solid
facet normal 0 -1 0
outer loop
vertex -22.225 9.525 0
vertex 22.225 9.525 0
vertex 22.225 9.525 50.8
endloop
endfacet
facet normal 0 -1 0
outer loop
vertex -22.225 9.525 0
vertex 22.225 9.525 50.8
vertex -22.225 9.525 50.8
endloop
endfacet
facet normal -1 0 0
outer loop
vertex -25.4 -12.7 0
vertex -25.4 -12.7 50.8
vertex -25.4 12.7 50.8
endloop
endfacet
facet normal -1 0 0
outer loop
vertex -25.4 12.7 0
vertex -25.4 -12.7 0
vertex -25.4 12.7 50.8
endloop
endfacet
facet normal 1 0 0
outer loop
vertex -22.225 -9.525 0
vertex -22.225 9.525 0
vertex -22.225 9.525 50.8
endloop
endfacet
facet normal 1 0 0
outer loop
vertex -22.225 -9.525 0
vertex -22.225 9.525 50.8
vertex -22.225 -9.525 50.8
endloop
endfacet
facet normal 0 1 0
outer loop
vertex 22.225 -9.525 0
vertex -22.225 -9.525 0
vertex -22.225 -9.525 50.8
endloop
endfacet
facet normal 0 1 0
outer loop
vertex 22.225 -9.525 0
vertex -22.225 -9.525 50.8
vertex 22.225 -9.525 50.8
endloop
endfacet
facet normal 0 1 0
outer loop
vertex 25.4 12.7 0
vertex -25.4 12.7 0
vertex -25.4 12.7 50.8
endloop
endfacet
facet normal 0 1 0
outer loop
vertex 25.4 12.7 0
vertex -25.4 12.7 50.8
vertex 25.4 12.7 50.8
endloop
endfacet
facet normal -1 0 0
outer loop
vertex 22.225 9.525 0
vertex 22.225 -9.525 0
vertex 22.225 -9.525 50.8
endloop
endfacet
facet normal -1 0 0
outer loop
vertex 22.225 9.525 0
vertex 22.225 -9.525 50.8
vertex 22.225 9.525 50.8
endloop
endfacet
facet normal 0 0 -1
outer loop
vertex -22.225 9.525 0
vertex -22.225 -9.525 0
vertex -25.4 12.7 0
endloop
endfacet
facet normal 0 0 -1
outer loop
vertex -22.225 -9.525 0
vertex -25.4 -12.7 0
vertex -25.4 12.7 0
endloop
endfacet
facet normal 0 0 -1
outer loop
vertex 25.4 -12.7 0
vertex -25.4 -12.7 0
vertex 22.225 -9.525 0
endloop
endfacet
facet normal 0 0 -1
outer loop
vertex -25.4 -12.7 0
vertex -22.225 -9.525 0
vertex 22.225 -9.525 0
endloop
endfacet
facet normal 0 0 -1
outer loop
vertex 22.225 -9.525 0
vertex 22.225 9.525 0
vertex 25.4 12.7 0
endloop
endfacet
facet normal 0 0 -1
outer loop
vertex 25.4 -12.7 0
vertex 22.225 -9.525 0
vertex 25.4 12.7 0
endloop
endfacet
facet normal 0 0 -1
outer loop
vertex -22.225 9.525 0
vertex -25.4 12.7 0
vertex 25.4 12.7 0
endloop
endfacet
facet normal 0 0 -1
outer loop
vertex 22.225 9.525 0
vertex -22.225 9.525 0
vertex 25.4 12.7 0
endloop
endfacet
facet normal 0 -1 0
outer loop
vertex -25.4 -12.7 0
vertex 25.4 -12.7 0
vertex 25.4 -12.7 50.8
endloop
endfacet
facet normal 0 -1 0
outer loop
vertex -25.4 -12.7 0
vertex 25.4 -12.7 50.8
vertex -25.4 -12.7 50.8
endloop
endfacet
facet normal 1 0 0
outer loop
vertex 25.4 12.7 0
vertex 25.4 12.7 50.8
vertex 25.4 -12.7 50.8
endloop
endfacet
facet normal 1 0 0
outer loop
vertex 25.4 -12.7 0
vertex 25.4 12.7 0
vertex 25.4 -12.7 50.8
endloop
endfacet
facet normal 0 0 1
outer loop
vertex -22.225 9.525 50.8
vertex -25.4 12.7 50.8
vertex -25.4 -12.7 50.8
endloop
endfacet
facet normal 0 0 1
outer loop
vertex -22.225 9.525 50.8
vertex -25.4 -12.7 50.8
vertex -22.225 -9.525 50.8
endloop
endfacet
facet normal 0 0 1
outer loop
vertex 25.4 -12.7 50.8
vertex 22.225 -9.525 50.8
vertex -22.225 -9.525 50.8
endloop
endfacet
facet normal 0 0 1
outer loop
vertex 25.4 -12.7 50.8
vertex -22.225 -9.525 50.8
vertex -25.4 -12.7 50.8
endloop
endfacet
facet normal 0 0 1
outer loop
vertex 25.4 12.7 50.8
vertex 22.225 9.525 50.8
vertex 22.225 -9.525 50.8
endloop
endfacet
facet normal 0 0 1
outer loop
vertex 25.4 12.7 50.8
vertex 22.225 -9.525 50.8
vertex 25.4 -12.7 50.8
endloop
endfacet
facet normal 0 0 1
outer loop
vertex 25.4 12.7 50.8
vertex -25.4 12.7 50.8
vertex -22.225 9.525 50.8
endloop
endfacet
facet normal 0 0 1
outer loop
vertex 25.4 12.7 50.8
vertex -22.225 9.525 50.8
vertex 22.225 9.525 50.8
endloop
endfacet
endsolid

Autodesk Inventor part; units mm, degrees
ref_plane "YZ Plane" through (0, 0, 0) normal (1, 0, 0) x (0, 1, 0)
ref_plane "Start Plane" through (0, 0, 0) normal (0, 0, 1) x (1, 0, 0)
ref_plane "End Plane" through (0, 0, 50.8) normal (0, 0, 1) x (1, 0, 0)
sketch "Sketch1" plane through (0, 0, 0) normal (0, 0, 1) x (1, 0, 0)
  line L0 (-25.4, 12.7) -> (25.4, 12.7)
  line L1 (25.4, 12.7) -> (25.4, -12.7)
  line L2 (25.4, -12.7) -> (-25.4, -12.7)
  line L3 (-25.4, -12.7) -> (-25.4, 12.7)
  line L4 (22.225, 9.525) -> (-22.225, 9.525)
  line L5 (-22.225, 9.525) -> (-22.225, -9.525)
  line L6 (-22.225, -9.525) -> (22.225, -9.525)
  line L7 (22.225, -9.525) -> (22.225, 9.525)
  point P0 (0, 0)
  point P1 (0, 12.7)
  point P2 (-25.4, 0)
  dimension "d0" = 50.8
  dimension "d1" = 25.4
  dimension "d2" = 3.175
extrude "Body" add sketch "Sketch1" along normal up to surface (50.8 mm away) from surface at 0
sketch "Sketch2" plane through (0, 0, 0) normal (0, 0, 1) x (1, 0, 0)
  line L0 (0, 0) -> (10, 0)
ref_plane "Work Plane3" through (0, 0, 0) normal (0, -1, 0) x (1, 0, 0)
sketch "Sketch3" plane through (0, 0, 0) normal (0, -1, 0) x (1, 0, 0)
  line L0 (-35.56, 0) -> (35.56, 0)
  line L1 (-35.56, 50.8) -> (35.56, 50.8)
  dimension "d10" = 50.8
equation "\"G_OFFSET_START\" = 0"
equation "\"G_OFFSET_END\" = 0"
equation "\"d6\" = length + G_OFFSET_END"
equation "\"G_L\" = d10"
equation "\"length\" = 50.8"
properties part number "2x1x.125 Tube"
